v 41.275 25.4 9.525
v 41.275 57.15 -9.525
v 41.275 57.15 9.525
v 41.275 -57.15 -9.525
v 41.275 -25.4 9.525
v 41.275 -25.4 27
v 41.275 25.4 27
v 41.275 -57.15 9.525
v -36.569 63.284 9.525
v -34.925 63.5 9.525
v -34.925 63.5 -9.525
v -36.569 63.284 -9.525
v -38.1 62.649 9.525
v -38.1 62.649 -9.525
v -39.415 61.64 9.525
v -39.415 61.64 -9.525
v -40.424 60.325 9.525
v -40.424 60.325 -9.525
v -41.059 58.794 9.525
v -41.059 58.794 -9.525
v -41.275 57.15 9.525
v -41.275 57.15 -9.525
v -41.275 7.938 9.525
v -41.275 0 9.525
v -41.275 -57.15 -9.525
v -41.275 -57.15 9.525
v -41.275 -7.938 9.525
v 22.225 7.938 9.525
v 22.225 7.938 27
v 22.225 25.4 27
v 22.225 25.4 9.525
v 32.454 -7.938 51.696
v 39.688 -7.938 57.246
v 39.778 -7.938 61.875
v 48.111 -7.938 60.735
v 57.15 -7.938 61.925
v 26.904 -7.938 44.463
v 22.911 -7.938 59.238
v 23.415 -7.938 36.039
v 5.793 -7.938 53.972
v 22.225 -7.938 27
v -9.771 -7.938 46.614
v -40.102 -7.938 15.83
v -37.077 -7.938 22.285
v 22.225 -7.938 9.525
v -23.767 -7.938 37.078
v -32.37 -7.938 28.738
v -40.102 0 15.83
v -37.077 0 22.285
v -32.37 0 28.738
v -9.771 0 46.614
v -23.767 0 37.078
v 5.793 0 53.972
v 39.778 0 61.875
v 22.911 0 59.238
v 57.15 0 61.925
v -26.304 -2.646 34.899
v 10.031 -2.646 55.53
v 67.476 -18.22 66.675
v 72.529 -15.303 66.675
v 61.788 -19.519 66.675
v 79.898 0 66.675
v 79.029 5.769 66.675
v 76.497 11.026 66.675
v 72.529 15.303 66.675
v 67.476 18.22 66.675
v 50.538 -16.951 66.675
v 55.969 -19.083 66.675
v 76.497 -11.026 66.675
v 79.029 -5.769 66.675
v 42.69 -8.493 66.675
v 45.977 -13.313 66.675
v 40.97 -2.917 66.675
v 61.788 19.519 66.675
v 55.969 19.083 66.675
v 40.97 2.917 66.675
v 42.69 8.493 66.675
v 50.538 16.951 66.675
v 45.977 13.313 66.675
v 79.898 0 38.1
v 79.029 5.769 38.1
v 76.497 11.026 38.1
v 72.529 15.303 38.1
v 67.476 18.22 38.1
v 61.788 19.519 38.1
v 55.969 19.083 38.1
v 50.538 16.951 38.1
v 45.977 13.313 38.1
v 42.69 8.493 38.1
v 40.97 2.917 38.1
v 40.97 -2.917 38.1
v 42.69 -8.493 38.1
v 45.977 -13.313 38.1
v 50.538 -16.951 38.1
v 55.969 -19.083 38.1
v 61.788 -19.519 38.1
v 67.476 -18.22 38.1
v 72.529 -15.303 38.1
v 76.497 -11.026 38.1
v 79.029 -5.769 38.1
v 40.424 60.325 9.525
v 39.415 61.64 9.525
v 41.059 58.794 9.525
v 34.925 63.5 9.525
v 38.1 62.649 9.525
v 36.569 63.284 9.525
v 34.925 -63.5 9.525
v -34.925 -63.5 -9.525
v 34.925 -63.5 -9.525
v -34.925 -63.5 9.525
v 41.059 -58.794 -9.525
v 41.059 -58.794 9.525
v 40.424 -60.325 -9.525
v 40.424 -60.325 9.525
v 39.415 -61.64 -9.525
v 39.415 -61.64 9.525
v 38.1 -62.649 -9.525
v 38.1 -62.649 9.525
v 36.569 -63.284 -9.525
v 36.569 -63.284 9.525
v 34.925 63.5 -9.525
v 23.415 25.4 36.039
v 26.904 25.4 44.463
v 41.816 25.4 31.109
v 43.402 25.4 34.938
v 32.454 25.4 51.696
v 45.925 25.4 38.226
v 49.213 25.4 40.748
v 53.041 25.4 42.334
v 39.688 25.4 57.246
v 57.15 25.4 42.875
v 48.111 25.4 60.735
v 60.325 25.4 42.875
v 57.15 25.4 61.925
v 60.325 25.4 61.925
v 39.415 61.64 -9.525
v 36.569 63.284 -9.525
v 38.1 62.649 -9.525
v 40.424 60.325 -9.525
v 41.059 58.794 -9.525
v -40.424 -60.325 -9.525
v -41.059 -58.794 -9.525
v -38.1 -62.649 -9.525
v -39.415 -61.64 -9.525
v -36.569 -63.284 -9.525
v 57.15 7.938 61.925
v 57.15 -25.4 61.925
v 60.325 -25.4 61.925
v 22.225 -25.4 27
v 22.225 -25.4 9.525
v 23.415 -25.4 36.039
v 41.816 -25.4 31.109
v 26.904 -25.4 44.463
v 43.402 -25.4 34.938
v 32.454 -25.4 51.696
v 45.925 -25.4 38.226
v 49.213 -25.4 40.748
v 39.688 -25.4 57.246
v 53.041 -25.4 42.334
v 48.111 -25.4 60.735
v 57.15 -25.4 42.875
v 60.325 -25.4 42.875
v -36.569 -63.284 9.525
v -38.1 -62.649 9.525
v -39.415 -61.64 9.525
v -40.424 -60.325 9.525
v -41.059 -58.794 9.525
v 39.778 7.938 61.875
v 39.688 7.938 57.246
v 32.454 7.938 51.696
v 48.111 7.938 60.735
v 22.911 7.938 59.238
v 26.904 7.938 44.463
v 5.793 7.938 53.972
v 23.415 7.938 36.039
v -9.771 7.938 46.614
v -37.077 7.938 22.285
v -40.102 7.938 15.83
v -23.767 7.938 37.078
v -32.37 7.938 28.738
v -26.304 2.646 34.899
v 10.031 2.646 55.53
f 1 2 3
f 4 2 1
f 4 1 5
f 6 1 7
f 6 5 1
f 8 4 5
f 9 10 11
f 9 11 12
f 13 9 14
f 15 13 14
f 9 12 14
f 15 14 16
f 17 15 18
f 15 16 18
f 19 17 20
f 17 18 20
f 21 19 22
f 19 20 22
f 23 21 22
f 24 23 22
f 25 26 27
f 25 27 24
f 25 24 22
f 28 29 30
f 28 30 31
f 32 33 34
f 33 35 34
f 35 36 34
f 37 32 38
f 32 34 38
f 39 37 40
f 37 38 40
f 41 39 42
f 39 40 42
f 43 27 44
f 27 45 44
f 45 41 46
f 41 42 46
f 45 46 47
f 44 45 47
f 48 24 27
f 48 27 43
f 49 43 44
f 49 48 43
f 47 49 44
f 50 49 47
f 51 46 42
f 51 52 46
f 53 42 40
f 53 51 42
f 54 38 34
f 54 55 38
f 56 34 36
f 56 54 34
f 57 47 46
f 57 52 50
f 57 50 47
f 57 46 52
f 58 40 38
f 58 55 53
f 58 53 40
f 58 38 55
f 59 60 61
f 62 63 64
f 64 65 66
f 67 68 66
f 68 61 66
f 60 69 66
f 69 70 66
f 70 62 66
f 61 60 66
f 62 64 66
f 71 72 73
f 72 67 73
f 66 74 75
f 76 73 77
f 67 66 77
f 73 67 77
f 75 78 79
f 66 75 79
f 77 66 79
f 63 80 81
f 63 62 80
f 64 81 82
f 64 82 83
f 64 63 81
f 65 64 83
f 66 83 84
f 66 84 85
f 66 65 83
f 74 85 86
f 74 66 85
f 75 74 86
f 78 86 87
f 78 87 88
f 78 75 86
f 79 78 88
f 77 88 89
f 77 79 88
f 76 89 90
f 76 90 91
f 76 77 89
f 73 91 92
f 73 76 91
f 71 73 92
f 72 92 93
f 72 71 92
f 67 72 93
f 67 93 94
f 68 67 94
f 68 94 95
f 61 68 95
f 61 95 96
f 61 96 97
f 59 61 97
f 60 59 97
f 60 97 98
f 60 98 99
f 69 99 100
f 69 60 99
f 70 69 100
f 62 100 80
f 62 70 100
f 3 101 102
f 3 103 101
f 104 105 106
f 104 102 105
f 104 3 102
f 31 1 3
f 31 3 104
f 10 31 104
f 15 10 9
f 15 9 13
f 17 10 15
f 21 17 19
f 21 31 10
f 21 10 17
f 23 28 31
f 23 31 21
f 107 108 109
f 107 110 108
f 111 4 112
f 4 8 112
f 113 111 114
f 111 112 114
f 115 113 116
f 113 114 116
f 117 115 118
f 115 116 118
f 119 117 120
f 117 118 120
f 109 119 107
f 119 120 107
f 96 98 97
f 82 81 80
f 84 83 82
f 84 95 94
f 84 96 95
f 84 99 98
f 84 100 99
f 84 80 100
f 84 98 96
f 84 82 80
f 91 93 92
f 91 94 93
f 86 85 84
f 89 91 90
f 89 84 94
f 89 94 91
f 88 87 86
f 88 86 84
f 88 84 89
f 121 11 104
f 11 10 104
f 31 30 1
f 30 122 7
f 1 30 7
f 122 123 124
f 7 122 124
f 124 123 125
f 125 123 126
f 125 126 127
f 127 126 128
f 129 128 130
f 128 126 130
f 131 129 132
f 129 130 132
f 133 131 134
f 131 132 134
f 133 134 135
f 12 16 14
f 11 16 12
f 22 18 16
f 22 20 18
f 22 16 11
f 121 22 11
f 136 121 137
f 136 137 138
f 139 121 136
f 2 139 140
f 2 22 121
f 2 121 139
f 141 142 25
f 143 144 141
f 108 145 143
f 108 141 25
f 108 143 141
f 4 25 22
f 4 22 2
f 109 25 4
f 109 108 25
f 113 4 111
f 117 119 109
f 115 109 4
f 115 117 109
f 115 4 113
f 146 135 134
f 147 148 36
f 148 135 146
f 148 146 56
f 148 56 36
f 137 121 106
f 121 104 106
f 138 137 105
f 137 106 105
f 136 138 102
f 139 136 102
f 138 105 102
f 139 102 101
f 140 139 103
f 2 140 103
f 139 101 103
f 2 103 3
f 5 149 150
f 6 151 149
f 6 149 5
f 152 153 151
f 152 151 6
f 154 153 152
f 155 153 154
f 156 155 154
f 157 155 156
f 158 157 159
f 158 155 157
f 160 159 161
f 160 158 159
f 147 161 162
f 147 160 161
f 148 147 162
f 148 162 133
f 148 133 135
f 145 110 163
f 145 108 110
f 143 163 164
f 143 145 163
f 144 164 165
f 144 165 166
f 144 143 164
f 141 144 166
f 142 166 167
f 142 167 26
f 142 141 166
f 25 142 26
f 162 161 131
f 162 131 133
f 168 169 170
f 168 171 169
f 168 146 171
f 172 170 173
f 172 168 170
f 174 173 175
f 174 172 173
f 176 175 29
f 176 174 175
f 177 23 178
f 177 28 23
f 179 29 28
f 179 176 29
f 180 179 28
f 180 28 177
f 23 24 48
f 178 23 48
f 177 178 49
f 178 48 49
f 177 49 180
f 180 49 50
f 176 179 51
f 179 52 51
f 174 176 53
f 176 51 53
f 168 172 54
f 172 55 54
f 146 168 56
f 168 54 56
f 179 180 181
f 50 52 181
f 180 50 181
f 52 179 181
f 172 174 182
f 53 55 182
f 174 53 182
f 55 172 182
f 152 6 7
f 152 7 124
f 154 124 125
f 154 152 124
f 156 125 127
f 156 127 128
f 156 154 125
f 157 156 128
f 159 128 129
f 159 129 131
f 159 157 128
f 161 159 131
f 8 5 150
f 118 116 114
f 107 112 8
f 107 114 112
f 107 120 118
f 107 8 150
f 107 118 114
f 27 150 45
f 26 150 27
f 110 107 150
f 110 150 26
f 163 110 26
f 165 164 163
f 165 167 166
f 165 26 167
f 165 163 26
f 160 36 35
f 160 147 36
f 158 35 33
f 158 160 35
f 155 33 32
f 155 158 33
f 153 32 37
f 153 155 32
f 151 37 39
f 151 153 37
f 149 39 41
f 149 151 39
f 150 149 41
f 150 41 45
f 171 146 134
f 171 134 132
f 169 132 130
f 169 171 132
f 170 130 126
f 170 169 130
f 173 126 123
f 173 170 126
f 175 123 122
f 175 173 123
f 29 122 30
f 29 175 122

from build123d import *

# Parameters (mm, degrees)
F1_DEPTH = 63.5
F2_DEPTH = 25.4
F3_DEPTH = 7.9375
F0_W     = 19.5734977533
F0_H     = 19.05
F0_H_2   = 4.7752
F0_H_3   = 4.7498
F5_R     = 6.35


with BuildPart() as f1:
    # F0 (on Front) → F1 (new body, symmetric)
    with BuildSketch(Plane.XZ):
        Polygon((-41.275, -9.525), (41.275, -9.525), (41.275, 9.525), (22.225, 9.525), (-41.275, 9.525), align=None)
    extrude(amount=F1_DEPTH, both=True)

    # F0 (on Front) → F2 (join, symmetric)
    with BuildSketch(Plane.XZ):
        with BuildLine():
            Line((22.225, 9.525), (41.275, 9.525))
            Line((41.275, 9.525), (41.275, 27.0002))
            ThreePointArc((41.275, 27.0002), (45.9246798487, 38.2255201513), (57.15, 42.8752))
            Line((57.15, 42.8752), (60.325, 42.8752))
            Line((60.325, 42.8752), (60.325, 61.9252))
            Line((60.325, 61.9252), (57.15, 61.9252))
            ThreePointArc((57.15, 61.9252), (32.4542956671, 51.6959043329), (22.225, 27.0002))
            Line((22.225, 27.0002), (22.225, 9.525))
        make_face()
    extrude(amount=F2_DEPTH, both=True)

    # F0 (on Front) → F3 (join, symmetric)
    with BuildSketch(Plane.XZ):
        with BuildLine():
            add(Edge.make_bspline(
                [(-41.275, 9.525), (-40.5122078955, 34.1071225703), (8.1664975733, 65.8123269677), (57.15, 61.9252)],
                knots=[0, 0, 0, 0, 111.5045361635, 111.5045361635, 111.5045361635, 111.5045361635], degree=3))
            Line((-41.275, 9.525), (22.225, 9.525))
            Line((22.225, 9.525), (22.225, 27.0002))
            ThreePointArc((22.225, 27.0002), (32.4542956671, 51.6959043329), (57.15, 61.9252))
        make_face()
    extrude(amount=F3_DEPTH, both=True)

    # F5
    f5_edges = [f1.edges().sort_by_distance(p)[0] for p in [
        (41.275, -63.5, 0),
        (41.275, 63.5, 0),
        (-41.275, 63.5, 0),
        (-41.275, -63.5, 0),
    ]]
    fillet(f5_edges, radius=F5_R)


with BuildPart() as f4:
    # F0 (on Front) → F4 (revolve)
    with BuildSketch(Plane.XZ):
        with Locations((70.1117488767, 52.4002)):
            Rectangle(F0_W, F0_H)
        with Locations((70.1117488767, 40.4876)):
            Rectangle(F0_W, F0_H_2)
        with Locations((70.1117488767, 64.3001)):
            Rectangle(F0_W, F0_H_3)
    revolve(axis=Axis((60.325, 0, 52.3875), (0, 0, 1)))


solid = Compound([f1.part, f4.part])
